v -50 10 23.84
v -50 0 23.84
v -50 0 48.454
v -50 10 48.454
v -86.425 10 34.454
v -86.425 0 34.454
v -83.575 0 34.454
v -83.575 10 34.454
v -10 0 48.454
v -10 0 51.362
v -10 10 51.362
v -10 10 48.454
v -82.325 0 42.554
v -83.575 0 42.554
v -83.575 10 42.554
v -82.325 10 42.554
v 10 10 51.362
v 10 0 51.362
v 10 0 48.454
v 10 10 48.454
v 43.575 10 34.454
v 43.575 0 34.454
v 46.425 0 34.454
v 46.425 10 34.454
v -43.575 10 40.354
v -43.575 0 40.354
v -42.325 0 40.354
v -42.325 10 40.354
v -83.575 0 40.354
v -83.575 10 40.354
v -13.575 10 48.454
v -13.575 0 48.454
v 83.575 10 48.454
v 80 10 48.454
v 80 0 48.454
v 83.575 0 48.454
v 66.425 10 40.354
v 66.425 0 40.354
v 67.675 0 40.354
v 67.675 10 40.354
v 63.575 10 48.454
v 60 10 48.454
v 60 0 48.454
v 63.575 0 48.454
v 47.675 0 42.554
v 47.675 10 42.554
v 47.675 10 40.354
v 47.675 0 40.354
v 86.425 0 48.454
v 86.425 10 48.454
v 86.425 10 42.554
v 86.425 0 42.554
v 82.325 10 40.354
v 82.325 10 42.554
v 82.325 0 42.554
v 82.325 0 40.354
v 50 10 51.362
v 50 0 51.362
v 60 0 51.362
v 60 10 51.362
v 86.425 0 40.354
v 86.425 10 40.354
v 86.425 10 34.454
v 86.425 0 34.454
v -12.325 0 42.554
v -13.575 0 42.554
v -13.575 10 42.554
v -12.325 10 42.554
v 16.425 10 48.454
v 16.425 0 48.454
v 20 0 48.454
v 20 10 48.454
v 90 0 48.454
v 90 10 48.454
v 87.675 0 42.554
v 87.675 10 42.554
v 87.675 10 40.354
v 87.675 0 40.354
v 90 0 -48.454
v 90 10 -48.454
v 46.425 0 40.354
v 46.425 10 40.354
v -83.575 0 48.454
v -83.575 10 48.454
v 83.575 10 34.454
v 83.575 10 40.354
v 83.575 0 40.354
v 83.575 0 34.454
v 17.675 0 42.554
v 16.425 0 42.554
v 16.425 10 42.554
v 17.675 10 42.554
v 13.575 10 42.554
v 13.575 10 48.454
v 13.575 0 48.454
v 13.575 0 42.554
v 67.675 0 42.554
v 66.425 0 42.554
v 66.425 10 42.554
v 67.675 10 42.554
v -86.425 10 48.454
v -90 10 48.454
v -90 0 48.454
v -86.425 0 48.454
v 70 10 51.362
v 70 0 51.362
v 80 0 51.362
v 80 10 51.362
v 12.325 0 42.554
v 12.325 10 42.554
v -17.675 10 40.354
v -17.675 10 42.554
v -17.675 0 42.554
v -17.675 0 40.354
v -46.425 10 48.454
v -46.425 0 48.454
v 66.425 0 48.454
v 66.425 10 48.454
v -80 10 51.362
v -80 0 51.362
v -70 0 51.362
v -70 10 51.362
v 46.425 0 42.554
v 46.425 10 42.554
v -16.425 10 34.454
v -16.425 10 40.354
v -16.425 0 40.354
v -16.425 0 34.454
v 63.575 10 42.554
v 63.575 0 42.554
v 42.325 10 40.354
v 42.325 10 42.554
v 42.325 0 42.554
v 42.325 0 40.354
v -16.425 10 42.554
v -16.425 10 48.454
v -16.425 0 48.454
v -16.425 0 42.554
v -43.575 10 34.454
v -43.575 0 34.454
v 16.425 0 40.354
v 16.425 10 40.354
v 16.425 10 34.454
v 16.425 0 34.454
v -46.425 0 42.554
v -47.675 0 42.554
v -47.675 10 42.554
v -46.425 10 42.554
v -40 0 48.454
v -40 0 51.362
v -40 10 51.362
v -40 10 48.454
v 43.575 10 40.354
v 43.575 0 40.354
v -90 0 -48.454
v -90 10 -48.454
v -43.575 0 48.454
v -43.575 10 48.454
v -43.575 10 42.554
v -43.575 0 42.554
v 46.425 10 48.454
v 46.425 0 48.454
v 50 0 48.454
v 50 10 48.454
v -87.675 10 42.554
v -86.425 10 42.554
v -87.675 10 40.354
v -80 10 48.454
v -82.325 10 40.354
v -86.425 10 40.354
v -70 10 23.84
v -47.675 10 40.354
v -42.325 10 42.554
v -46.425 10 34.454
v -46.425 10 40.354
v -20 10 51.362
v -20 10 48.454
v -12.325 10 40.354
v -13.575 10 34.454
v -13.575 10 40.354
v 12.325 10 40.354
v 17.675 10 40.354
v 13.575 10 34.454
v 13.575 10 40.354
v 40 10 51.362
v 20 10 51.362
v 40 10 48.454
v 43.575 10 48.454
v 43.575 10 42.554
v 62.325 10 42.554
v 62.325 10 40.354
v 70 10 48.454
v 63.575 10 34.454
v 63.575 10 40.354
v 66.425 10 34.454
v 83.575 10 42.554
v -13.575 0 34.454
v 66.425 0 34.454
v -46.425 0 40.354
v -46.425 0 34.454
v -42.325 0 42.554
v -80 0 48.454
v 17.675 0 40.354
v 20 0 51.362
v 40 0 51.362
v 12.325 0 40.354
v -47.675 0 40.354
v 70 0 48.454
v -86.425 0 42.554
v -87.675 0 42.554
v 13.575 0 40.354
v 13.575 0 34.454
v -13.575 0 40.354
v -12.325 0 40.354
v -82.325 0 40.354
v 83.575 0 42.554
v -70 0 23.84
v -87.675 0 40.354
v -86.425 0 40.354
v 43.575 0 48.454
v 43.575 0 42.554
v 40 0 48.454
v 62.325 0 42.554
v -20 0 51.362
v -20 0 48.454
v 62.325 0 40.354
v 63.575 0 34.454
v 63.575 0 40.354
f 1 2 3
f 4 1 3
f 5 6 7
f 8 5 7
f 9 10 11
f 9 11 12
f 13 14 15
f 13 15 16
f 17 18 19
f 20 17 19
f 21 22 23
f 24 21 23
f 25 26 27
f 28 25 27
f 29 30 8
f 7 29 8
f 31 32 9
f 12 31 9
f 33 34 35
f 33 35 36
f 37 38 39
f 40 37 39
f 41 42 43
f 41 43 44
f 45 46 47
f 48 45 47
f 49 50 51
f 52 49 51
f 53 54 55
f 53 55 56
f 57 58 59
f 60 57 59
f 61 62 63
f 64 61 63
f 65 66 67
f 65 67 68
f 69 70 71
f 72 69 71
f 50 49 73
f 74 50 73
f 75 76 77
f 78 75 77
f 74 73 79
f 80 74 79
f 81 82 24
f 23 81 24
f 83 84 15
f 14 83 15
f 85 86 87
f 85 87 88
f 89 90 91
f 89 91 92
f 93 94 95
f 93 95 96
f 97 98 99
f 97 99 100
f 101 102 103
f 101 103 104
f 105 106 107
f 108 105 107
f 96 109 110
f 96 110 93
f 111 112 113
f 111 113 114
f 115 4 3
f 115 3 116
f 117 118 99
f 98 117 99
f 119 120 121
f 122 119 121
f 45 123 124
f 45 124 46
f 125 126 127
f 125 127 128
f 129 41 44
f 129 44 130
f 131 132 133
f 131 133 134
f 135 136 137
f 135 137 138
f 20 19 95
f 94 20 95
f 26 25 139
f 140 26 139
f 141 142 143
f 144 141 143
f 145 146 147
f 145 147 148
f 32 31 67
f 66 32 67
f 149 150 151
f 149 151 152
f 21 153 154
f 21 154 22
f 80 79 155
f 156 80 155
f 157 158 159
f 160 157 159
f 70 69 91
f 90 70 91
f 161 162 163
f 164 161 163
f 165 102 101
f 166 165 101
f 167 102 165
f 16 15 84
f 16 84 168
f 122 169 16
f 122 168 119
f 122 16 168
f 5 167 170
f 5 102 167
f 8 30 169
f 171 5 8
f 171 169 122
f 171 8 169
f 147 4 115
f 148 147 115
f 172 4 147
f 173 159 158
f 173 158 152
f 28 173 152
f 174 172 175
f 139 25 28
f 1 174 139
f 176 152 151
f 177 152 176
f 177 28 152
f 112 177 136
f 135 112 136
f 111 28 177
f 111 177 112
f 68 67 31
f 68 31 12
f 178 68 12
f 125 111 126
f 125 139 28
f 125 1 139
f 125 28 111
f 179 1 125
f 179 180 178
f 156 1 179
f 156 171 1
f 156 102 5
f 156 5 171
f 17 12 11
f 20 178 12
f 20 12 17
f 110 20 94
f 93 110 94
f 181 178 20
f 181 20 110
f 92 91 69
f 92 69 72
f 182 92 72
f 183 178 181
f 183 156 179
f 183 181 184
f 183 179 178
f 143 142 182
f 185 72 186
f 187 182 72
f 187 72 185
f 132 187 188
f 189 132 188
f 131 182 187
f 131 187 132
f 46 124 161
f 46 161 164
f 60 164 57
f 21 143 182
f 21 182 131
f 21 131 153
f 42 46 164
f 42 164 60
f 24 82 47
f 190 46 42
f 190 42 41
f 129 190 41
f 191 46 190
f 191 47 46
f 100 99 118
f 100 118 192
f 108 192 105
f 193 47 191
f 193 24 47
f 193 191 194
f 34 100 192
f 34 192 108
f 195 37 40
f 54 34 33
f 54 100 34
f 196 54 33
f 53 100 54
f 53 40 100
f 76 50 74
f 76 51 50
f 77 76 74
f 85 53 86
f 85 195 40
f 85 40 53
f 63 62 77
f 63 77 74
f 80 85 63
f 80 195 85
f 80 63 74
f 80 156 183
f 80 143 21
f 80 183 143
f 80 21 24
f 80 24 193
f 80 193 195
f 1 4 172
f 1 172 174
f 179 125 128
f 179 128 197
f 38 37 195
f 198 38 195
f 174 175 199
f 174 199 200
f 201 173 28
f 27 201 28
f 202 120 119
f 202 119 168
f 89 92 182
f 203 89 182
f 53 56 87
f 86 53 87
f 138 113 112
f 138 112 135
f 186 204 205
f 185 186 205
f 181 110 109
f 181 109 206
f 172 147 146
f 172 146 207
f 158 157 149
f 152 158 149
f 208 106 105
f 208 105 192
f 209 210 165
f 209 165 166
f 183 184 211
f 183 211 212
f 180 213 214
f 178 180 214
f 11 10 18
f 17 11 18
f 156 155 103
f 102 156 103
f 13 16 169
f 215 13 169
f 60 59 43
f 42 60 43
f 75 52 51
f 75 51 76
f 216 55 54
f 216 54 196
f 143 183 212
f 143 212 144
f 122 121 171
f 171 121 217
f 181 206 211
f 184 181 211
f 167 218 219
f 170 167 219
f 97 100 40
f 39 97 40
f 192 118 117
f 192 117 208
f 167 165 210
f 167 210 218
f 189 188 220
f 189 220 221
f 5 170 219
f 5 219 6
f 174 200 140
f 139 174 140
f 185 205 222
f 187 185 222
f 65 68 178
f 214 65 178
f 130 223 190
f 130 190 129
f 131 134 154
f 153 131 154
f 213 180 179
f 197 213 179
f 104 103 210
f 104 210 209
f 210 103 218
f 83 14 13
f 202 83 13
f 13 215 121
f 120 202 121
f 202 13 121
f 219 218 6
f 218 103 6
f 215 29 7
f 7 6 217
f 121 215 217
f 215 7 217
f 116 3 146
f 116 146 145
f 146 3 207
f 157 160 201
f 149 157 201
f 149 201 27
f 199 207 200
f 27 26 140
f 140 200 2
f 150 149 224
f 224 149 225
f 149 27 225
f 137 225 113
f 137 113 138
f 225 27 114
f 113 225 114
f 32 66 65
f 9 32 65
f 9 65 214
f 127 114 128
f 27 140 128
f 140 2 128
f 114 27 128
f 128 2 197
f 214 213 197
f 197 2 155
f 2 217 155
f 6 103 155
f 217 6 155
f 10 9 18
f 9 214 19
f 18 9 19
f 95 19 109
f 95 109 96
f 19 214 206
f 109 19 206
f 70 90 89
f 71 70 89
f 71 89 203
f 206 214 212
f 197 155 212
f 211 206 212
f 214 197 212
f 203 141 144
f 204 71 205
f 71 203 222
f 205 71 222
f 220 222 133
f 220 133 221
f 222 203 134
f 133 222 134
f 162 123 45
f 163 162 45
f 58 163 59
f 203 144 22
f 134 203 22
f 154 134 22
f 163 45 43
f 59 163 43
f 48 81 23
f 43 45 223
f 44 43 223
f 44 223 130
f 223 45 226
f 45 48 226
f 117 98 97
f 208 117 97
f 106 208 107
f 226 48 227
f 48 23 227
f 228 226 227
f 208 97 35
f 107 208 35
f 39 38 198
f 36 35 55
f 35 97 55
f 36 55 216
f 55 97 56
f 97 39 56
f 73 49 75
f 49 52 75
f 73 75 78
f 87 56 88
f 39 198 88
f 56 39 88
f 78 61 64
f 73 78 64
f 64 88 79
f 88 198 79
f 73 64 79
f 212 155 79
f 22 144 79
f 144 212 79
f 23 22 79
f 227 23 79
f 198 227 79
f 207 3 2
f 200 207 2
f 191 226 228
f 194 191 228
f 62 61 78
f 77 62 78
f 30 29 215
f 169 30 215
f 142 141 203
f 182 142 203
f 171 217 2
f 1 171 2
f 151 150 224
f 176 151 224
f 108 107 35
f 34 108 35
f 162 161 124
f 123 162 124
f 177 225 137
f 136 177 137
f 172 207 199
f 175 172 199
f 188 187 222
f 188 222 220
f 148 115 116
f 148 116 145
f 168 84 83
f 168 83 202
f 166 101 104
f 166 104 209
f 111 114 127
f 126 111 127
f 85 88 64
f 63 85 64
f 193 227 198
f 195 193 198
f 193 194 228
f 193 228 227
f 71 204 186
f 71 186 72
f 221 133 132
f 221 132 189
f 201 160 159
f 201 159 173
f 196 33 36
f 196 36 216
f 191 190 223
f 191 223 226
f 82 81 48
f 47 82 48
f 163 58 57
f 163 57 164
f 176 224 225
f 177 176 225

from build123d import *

# Parameters (mm, degrees)
SKETCH1_W           = 10
SKETCH1_H           = 2.907263933
SKETCH1_W_2         = 20
BOSS_EXTRUDE1_DEPTH = 10
SKETCH3_W           = 2.85
SKETCH3_H           = 14
SKETCH3_W_2         = 5.35
SKETCH3_H_2         = 2.2
CUT_EXTRUDE1_DEPTH  = 10


with BuildPart() as part:
    # Sketch1 → Boss-Extrude1 (new body)
    with BuildSketch(Plane(origin=(0, 0, 0), x_dir=(1, 0, 0), z_dir=(0, 1, 0))):
        Polygon((80, -48.454398885), (90, -48.454398885), (90, 48.454398885), (-90, 48.454398885), (-90, -48.454398885), (-80, -48.454398885), (-70, -48.454398885), (-70, -23.839564252), (-50, -23.839564252), (-50, -48.454398885), (-40, -48.454398885), (-20, -48.454398885), (-10, -48.454398885), (10, -48.454398885), (20, -48.454398885), (40, -48.454398885), (50, -48.454398885), (60, -48.454398885), (70, -48.454398885), align=None)
        with Locations((-75, -49.908030852)):
            Rectangle(SKETCH1_W, SKETCH1_H)
        with Locations((-30, -49.908030852)):
            Rectangle(SKETCH1_W_2, SKETCH1_H)
        with Locations((0, -49.908030852)):
            Rectangle(SKETCH1_W_2, SKETCH1_H)
        with Locations((30, -49.908030852)):
            Rectangle(SKETCH1_W_2, SKETCH1_H)
        with Locations((55, -49.908030852)):
            Rectangle(SKETCH1_W, SKETCH1_H)
        with Locations((75, -49.908030852)):
            Rectangle(SKETCH1_W, SKETCH1_H)
    extrude(amount=BOSS_EXTRUDE1_DEPTH)

    # Sketch3 → Cut-Extrude1 (cut)
    with BuildSketch(Plane(origin=(0, 10, 0), x_dir=(1, 0, 0), z_dir=(0, 1, 0))):
        with Locations((-85, -41.454398885)):
            Rectangle(SKETCH3_W, SKETCH3_H)
        with Locations((-85, -41.454398885)):
            Rectangle(SKETCH3_W_2, SKETCH3_H_2)
        with Locations((-45, -41.454398885)):
            Rectangle(SKETCH3_W, SKETCH3_H)
        with Locations((-45, -41.454398885)):
            Rectangle(SKETCH3_W_2, SKETCH3_H_2)
        with Locations((-15, -41.454398885)):
            Rectangle(SKETCH3_W, SKETCH3_H)
        with Locations((-15, -41.454398885)):
            Rectangle(SKETCH3_W_2, SKETCH3_H_2)
        with Locations((15, -41.454398885)):
            Rectangle(SKETCH3_W, SKETCH3_H)
        with Locations((15, -41.454398885)):
            Rectangle(SKETCH3_W_2, SKETCH3_H_2)
        with Locations((45, -41.454398885)):
            Rectangle(SKETCH3_W, SKETCH3_H)
        with Locations((45, -41.454398885)):
            Rectangle(SKETCH3_W_2, SKETCH3_H_2)
        with Locations((65, -41.454398885)):
            Rectangle(SKETCH3_W, SKETCH3_H)
        with Locations((65, -41.454398885)):
            Rectangle(SKETCH3_W_2, SKETCH3_H_2)
        with Locations((85, -41.454398885)):
            Rectangle(SKETCH3_W, SKETCH3_H)
        with Locations((85, -41.454398885)):
            Rectangle(SKETCH3_W_2, SKETCH3_H_2)
    extrude(amount=-CUT_EXTRUDE1_DEPTH, mode=Mode.SUBTRACT)


solid = part.part
